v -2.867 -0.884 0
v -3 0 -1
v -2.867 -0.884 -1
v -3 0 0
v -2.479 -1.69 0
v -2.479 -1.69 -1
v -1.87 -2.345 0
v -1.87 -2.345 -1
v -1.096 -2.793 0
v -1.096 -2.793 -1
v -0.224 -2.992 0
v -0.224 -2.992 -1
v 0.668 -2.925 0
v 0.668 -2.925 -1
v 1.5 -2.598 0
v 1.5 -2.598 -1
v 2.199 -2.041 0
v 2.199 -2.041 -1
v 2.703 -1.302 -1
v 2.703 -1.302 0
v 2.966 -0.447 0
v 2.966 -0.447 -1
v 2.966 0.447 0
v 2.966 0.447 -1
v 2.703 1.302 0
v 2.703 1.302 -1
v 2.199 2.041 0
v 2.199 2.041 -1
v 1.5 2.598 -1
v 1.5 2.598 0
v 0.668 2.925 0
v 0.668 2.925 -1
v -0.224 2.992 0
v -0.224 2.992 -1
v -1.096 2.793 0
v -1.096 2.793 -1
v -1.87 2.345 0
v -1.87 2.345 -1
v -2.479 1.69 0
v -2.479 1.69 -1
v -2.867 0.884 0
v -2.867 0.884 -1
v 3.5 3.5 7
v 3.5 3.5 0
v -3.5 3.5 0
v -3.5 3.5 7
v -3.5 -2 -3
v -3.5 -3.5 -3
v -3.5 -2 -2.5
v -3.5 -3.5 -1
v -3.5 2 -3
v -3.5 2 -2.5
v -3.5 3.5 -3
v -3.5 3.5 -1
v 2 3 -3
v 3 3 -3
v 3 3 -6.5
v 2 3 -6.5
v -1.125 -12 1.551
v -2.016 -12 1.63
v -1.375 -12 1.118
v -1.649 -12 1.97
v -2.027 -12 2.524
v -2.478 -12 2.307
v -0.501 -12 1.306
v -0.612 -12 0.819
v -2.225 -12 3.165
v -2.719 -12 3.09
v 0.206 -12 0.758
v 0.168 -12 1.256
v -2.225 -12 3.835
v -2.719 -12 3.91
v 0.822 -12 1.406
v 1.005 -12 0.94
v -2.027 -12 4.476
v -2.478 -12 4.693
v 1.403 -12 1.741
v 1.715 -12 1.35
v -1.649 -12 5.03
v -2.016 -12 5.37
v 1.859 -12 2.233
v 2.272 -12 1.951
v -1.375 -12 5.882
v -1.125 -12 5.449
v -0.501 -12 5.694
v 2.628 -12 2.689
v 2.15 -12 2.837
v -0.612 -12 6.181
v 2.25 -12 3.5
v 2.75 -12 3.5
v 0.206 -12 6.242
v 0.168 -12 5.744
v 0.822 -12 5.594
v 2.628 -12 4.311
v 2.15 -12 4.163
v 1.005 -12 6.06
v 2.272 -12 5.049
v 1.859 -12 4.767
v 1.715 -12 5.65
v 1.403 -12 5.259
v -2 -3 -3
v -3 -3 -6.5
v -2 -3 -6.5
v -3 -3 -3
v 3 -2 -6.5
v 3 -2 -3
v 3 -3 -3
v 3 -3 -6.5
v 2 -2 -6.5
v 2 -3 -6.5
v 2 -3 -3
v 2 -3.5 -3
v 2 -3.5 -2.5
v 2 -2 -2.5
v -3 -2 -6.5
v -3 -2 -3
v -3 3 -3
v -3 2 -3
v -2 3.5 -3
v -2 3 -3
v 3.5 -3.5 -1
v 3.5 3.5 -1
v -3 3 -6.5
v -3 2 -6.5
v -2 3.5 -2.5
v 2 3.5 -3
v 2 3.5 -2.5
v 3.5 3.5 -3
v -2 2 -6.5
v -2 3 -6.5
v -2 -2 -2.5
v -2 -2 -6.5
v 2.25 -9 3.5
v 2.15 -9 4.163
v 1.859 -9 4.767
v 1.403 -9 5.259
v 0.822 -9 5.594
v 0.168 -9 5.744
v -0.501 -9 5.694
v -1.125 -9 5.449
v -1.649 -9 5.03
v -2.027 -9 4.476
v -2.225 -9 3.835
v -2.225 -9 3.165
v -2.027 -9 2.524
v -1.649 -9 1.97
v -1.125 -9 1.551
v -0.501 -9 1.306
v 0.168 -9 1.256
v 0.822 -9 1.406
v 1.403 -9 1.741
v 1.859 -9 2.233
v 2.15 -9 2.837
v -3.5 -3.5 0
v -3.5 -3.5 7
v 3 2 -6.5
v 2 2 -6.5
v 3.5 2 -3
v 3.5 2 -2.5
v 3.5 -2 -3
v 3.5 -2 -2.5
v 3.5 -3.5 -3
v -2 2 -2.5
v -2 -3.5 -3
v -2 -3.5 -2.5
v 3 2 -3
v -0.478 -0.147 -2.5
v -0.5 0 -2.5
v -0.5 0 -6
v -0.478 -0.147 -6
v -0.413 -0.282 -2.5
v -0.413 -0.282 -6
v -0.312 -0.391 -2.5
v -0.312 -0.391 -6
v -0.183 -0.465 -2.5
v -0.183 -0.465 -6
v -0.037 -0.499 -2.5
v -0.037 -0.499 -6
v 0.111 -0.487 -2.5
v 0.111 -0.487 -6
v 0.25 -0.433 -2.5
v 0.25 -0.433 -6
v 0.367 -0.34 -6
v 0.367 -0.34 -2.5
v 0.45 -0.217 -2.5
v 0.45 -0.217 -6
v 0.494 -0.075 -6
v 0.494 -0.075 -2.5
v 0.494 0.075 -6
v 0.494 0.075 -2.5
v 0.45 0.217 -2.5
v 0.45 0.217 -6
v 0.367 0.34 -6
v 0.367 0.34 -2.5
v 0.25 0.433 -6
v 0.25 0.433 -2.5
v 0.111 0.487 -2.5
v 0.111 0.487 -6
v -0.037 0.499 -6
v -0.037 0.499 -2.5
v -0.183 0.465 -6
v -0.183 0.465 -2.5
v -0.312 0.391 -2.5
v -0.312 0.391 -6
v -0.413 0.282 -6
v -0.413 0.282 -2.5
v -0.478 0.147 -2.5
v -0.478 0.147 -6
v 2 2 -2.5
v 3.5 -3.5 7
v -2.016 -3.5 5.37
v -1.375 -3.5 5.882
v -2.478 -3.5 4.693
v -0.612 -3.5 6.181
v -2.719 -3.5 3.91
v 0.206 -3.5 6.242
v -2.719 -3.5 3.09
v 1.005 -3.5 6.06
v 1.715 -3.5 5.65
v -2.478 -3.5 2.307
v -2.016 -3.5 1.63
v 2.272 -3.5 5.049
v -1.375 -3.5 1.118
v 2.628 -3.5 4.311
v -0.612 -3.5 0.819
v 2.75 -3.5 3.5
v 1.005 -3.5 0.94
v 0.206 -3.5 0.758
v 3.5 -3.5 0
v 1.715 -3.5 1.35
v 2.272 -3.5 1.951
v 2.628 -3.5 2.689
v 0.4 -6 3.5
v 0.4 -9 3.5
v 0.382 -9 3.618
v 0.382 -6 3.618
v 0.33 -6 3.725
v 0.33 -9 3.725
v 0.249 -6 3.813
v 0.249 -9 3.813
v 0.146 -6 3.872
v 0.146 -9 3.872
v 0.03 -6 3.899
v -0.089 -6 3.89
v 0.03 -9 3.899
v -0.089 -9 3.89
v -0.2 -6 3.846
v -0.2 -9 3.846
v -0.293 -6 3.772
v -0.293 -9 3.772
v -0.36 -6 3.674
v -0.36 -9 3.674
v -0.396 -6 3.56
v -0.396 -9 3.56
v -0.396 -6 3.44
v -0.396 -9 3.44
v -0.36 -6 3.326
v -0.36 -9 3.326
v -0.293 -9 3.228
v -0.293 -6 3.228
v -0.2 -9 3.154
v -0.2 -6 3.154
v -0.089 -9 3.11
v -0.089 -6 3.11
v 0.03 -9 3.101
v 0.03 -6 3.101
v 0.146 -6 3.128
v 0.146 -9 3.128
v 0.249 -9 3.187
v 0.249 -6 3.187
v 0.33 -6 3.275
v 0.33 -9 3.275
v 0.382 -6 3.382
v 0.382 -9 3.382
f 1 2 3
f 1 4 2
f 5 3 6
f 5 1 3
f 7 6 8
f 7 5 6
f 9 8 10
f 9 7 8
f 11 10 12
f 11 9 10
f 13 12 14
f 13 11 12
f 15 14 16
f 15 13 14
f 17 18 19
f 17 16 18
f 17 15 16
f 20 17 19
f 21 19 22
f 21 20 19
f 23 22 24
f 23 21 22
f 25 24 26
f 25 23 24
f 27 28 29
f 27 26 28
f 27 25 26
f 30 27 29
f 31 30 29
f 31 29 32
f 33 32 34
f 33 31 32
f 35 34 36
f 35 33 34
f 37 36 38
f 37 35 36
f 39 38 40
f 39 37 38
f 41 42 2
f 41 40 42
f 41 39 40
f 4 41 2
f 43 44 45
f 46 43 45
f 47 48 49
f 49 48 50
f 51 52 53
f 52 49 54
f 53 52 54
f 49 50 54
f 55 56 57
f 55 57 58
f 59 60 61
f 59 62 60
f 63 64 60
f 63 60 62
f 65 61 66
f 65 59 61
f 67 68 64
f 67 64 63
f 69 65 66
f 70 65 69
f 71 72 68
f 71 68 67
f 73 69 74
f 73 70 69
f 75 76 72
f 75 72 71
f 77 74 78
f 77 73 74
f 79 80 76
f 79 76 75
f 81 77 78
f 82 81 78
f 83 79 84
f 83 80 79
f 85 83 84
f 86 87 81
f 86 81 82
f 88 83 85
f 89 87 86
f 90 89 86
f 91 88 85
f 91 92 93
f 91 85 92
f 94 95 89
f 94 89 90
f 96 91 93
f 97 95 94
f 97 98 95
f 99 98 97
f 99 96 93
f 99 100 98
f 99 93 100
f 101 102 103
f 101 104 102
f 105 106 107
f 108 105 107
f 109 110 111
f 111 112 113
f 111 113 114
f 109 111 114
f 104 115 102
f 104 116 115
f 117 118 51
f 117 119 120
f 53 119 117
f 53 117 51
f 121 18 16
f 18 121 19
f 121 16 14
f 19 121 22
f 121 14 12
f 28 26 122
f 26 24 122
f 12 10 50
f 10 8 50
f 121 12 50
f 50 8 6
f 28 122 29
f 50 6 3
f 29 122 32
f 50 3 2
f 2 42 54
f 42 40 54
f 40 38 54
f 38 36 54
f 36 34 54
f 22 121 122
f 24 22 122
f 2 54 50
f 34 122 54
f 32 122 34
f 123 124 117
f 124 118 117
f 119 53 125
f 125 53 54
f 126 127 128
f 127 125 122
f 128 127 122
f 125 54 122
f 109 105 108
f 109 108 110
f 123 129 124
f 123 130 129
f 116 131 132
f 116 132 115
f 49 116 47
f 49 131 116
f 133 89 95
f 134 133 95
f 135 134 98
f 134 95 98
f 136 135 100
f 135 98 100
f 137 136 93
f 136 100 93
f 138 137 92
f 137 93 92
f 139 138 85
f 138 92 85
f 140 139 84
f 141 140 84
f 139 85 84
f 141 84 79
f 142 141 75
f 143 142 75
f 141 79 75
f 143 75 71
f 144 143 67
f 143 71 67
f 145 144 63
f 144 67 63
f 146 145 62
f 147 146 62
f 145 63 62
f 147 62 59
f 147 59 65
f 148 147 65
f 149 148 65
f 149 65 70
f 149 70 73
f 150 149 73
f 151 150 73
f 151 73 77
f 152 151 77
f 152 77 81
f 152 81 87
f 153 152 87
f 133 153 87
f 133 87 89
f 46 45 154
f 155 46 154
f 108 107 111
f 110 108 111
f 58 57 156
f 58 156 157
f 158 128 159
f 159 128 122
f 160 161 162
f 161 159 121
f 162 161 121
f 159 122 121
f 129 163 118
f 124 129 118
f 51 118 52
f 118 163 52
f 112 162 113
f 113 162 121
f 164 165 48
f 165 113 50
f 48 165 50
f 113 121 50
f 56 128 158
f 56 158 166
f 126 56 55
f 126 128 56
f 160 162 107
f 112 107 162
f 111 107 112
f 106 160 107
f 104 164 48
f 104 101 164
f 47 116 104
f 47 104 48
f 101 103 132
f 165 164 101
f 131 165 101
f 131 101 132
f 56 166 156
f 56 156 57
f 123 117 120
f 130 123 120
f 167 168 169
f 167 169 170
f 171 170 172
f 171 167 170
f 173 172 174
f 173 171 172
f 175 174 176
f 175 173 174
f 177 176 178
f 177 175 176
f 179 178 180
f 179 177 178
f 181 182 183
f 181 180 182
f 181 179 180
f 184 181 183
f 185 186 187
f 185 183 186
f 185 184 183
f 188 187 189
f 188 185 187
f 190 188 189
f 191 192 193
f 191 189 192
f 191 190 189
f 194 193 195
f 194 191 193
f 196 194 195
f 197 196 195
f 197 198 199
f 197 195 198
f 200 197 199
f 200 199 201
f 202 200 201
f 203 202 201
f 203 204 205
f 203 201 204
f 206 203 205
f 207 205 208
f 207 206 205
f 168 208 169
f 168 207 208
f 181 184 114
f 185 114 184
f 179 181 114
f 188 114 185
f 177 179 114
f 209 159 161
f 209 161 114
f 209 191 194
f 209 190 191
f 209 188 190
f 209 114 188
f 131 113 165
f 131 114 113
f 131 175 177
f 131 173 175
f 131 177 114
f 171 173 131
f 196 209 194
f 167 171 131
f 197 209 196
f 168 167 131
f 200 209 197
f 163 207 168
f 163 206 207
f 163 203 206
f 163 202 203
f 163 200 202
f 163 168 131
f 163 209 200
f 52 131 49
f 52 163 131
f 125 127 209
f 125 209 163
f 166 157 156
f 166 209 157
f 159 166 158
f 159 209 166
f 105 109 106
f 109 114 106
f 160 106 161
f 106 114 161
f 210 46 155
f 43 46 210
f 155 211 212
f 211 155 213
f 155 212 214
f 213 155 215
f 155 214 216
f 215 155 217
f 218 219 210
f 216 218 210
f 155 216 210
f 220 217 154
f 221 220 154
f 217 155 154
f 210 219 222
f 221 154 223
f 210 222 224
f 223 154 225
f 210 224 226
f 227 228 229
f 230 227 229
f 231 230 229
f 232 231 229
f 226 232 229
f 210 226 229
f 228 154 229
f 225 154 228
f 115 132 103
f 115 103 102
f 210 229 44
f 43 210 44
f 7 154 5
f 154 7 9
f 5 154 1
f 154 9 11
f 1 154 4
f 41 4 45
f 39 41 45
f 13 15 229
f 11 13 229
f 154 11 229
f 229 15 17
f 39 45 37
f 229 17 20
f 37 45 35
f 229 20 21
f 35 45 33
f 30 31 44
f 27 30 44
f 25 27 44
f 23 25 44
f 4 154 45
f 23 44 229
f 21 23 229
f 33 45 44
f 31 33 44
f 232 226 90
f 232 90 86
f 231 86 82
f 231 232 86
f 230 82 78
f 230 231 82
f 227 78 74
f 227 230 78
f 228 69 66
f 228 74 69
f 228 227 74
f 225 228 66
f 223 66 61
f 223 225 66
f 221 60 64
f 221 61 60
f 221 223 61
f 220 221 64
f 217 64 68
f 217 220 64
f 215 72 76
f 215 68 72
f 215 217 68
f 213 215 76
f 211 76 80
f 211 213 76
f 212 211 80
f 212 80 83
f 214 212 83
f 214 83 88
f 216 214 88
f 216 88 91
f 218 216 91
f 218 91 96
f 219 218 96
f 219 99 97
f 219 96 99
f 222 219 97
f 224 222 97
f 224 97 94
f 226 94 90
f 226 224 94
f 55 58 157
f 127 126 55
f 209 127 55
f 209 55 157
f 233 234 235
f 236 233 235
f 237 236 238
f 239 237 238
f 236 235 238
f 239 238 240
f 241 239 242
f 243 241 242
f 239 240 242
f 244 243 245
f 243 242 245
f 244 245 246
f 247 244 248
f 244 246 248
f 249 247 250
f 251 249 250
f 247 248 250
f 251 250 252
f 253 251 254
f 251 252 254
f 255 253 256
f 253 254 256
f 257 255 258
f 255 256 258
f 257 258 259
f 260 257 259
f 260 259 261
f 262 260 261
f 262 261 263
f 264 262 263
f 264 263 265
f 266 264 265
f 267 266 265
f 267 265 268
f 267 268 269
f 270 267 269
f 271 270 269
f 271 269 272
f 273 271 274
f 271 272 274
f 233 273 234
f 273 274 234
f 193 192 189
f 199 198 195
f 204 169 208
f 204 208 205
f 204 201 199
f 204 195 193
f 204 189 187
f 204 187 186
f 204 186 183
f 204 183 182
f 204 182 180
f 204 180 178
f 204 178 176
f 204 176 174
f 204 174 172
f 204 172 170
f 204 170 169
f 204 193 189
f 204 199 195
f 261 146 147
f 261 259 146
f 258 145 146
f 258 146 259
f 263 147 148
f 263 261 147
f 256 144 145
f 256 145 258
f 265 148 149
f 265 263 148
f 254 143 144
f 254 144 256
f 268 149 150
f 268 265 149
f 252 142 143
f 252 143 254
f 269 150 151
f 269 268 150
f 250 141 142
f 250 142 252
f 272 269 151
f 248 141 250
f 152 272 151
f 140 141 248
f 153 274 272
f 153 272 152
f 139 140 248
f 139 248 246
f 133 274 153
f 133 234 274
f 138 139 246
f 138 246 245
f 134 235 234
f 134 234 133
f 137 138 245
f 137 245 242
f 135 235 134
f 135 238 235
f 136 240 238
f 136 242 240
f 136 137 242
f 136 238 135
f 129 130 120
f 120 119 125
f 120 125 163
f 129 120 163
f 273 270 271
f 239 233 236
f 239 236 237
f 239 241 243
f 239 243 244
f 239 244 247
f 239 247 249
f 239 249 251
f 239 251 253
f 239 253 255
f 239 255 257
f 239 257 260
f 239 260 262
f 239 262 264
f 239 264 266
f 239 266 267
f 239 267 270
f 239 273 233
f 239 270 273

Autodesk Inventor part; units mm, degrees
ref_plane "YZ Plane" through (0, 0, 0) normal (1, 0, 0) x (0, 1, 0)
ref_plane "XZ Plane" through (0, 0, 0) normal (0, 1, 0) x (-1, 0, 0)
ref_plane "XY Plane" through (0, 0, 0) normal (0, 0, 1) x (1, 0, 0)
sketch "Skizze1" plane through (0, 0, 0) normal (0, 0, 1) x (1, 0, 0)
  line L0 (-3.5, -3.5) -> (3.5, -3.5)
  line L1 (3.5, -3.5) -> (3.5, 3.5)
  line L2 (3.5, 3.5) -> (-3.5, 3.5)
  line L3 (-3.5, 3.5) -> (-3.5, -3.5)
  line L4 (-3.5, -3.5) -> (3.5, 3.5) construction
  line L5 (3.5, -3.5) -> (-3.5, 3.5) construction
  point P0 (0, 0)
  dimension "d0" = 7
  dimension "d1" = 7
extrude "Extrusion1" add sketch "Skizze1" along normal blind 7
sketch "Skizze2" plane through (0, 0, 0) normal (0, 0, -1) x (-1, 0, 0)
  circle A0 centre (0, 0) radius 3
  dimension "d4" = 6
extrude "Extrusion2" add sketch "Skizze2" along normal blind 1
sketch "Skizze3" plane through (0, 0, -1) normal (0, 0, -1) x (-1, 0, 0)
  line L0 (3.5, 3.5) -> (-3.5, 3.5)
  line L1 (-3.5, 3.5) -> (-3.5, -3.5)
  line L2 (-3.5, -3.5) -> (3.5, -3.5)
  line L3 (3.5, -3.5) -> (3.5, 3.5)
  line L4 (3.5, 3.5) -> (-3.5, -3.5) construction
  line L5 (-3.5, 3.5) -> (3.5, -3.5) construction
  point P0 (0, 0)
  dimension "d7" = 7
  dimension "d8" = 7
extrude "Extrusion3" add sketch "Skizze3" along normal blind 1.5
sketch "Skizze4" plane through (0, 0, -2.5) normal (0, 0, -1) x (-1, 0, 0)
  line L0 (3.5, 3.5) -> (-3.5, 3.5) projected
  line L1 (-3.5, 3.5) -> (-3.5, -3.5) projected
  line L2 (-3.5, -3.5) -> (3.5, -3.5) projected
  line L3 (3.5, -3.5) -> (3.5, 3.5) projected
  line L4 (-3.5, 3.5) -> (3.5, 3.5) projected
  line L5 (3.5, 3.5) -> (2, 3.5)
  line L6 (2, 3.5) -> (2, 2)
  line L7 (2, 2) -> (3.5, 2)
  line L8 (3.5, 2) -> (3.5, 3.5)
  line L9 (3.5, -3.5) -> (-3.5, -3.5) projected
  line L10 (3.5, -3.5) -> (2, -3.5)
  line L11 (2, -3.5) -> (2, -2)
  line L12 (2, -2) -> (3.5, -2)
  line L13 (3.5, -2) -> (3.5, -3.5)
  line L14 (-3.5, 3.5) -> (-2, 3.5)
  line L15 (-2, 3.5) -> (-2, 2)
  line L16 (-2, 2) -> (-3.5, 2)
  line L17 (-3.5, 2) -> (-3.5, 3.5)
  line L18 (-3.5, -3.5) -> (-3.5, 3.5) projected
  line L19 (-3.5, -3.5) -> (-2, -3.5)
  line L20 (-2, -3.5) -> (-2, -2)
  line L21 (-2, -2) -> (-3.5, -2)
  line L22 (-3.5, -2) -> (-3.5, -3.5)
  point P0 (0, 0)
  dimension "d11" = 1.5
  dimension "d12" = 1.5
  dimension "d13" = 1.5
  dimension "d14" = 1.5
  dimension "d15" = 1.5
  dimension "d16" = 1.5
  dimension "d17" = 1.5
  dimension "d18" = 1.5
extrude "Extrusion4" add sketch "Skizze4" along normal blind 0.5 contours L3 L7 L6 L0 | L15 L16 L1 L0 | L3 L2 L11 L12 | L21 L20 L2 L1
sketch "Skizze5" plane through (0, 0, -3) normal (0, 0, -1) x (-1, 0, 0)
  line L0 (3.5, -3.5) -> (3.5, -2) projected
  line L1 (3.5, -2) -> (2, -2) projected
  line L2 (2, -2) -> (2, -3.5) projected
  line L3 (2, -3.5) -> (3.5, -3.5) projected
  line L4 (-3.5, -3.5) -> (-2, -3.5) projected
  line L5 (-2, -3.5) -> (-2, -2) projected
  line L6 (-2, -2) -> (-3.5, -2) projected
  line L7 (-3.5, -2) -> (-3.5, -3.5) projected
  line L8 (-3.5, 3.5) -> (-3.5, 2) projected
  line L9 (-3.5, 2) -> (-2, 2) projected
  line L10 (-2, 2) -> (-2, 3.5) projected
  line L11 (-2, 3.5) -> (-3.5, 3.5) projected
  line L12 (3.5, 3.5) -> (2, 3.5) projected
  line L13 (2, 3.5) -> (2, 2) projected
  line L14 (2, 2) -> (3.5, 2) projected
  line L15 (3.5, 2) -> (3.5, 3.5) projected
  line L16 (2, -2) -> (3, -2)
  line L17 (3, -2) -> (3, -3)
  line L18 (3, -3) -> (2, -3)
  line L19 (2, -3) -> (2, -2)
  line L20 (-2, -2) -> (-3, -2)
  line L21 (-3, -2) -> (-3, -3)
  line L22 (-3, -3) -> (-2, -3)
  line L23 (-2, -3) -> (-2, -2)
  line L24 (-2, 2) -> (-3, 2)
  line L25 (-3, 2) -> (-3, 3)
  line L26 (-3, 3) -> (-2, 3)
  line L27 (-2, 3) -> (-2, 2)
  line L28 (2, 2) -> (3, 2)
  line L29 (3, 2) -> (3, 3)
  line L30 (3, 3) -> (2, 3)
  line L31 (2, 3) -> (2, 2)
  point P0 (0, 0)
  dimension "d21" = 1
  dimension "d22" = 1
  dimension "d23" = 1
  dimension "d24" = 1
  dimension "d25" = 1
  dimension "d26" = 1
  dimension "d27" = 1
  dimension "d28" = 1
extrude "Extrusion5" add sketch "Skizze5" along normal blind 3.5 contours L17 L18 L2 L1 | L22 L21 L6 L5 | L25 L26 L10 L9 | L30 L29 L14 L13
sketch "Skizze6" plane through (0, 0, -2.5) normal (0, 0, -1) x (-1, 0, 0)
  circle A0 centre (0, 0) radius 0.5
  dimension "d31" = 1
extrude "Extrusion6" add sketch "Skizze6" along normal blind 3.5
sketch "Skizze7" plane through (-3.5, -3.5, 0) normal (0, -1, 0) x (1, 0, 0)
  line L0 (0, 0) -> (7, 0) projected
  line L1 (7, 0) -> (7, 7) projected
  line L2 (0, 7) -> (7, 7) projected
  line L3 (0, 0) -> (0, 7) projected
  line L4 (0, 0) -> (0, 7) construction
  line L5 (0, 3.5) -> (7, 3.5) construction
  line L6 (3.5, 7) -> (3.5, 0) construction
  circle A0 centre (3.5, 3.5) radius 2.75
  dimension "d34" = 5.5
extrude "Extrusion7" add sketch "Skizze7" along normal blind 8.5 contours A0
thread "Gewinde1" size "1/4-36 UNS" class "2A" standard "ANSI Unified Screw Threads" length 5 offset 1
sketch "Skizze8" plane through (0, -12, 3.5) normal (0, -1, 0) x (1, 0, 0)
  circle A0 centre (0, 0) radius 2.75 projected
  circle A1 centre (0, 0) radius 2.25
  point P0 (0, -3.5)
  dimension "d39" = 4.5
extrude "Extrusion8" cut sketch "Skizze8" against normal blind 3 contours A1
sketch "Skizze9" plane through (0, -9, 3.5) normal (0, -1, 0) x (1, 0, 0)
  circle A0 centre (0, 0) radius 2.25 projected
  circle A1 centre (0, 0) radius 0.4
  point P0 (0, -3.5)
  dimension "d42" = 0.8
extrude "Extrusion9" cut sketch "Skizze9" against normal blind 3 contours A1
properties part number "SMA-F-RA" material "Messing, weicher Gelbton"
